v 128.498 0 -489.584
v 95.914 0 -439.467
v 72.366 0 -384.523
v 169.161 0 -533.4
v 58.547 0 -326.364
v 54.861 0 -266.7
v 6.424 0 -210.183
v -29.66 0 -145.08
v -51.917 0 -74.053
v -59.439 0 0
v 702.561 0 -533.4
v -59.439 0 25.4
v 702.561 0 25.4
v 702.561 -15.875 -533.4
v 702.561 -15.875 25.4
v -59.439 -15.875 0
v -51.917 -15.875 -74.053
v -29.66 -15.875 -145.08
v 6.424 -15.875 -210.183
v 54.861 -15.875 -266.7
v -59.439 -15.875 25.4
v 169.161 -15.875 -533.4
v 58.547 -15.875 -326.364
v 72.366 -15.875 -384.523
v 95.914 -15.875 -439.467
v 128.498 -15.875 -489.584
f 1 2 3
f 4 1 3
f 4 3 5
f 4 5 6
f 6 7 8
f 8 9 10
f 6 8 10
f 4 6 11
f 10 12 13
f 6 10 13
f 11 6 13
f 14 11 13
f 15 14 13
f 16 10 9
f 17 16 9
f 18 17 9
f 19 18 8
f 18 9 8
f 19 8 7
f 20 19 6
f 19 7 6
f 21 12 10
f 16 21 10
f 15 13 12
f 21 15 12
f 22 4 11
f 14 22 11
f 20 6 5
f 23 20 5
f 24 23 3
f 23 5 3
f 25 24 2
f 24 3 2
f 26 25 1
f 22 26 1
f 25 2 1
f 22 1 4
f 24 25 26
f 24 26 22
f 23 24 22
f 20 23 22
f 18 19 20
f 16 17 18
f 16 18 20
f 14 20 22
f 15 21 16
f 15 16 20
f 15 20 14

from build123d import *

# Parameters (mm, degrees)
F1_DEPTH = 15.875


with BuildPart() as f1:
    # F0 (on Front) → F1 (new body)
    with BuildSketch(Plane.XZ):
        with BuildLine():
            Line((702.561291, 25.4), (-59.438709, 25.4))
            Line((-59.438709, 25.4), (-59.438709, 0))
            ThreePointArc((-59.438709, 0), (-29.659824, -145.080478), (54.861291, -266.7))
            ThreePointArc((54.861291, -266.7), (82.960432, -412.500368), (169.161291, -533.4))
            Line((169.161291, -533.4), (702.561291, -533.4))
            Line((702.561291, -533.4), (702.561291, 25.4))
        make_face()
    extrude(amount=F1_DEPTH)


solid = f1.part
